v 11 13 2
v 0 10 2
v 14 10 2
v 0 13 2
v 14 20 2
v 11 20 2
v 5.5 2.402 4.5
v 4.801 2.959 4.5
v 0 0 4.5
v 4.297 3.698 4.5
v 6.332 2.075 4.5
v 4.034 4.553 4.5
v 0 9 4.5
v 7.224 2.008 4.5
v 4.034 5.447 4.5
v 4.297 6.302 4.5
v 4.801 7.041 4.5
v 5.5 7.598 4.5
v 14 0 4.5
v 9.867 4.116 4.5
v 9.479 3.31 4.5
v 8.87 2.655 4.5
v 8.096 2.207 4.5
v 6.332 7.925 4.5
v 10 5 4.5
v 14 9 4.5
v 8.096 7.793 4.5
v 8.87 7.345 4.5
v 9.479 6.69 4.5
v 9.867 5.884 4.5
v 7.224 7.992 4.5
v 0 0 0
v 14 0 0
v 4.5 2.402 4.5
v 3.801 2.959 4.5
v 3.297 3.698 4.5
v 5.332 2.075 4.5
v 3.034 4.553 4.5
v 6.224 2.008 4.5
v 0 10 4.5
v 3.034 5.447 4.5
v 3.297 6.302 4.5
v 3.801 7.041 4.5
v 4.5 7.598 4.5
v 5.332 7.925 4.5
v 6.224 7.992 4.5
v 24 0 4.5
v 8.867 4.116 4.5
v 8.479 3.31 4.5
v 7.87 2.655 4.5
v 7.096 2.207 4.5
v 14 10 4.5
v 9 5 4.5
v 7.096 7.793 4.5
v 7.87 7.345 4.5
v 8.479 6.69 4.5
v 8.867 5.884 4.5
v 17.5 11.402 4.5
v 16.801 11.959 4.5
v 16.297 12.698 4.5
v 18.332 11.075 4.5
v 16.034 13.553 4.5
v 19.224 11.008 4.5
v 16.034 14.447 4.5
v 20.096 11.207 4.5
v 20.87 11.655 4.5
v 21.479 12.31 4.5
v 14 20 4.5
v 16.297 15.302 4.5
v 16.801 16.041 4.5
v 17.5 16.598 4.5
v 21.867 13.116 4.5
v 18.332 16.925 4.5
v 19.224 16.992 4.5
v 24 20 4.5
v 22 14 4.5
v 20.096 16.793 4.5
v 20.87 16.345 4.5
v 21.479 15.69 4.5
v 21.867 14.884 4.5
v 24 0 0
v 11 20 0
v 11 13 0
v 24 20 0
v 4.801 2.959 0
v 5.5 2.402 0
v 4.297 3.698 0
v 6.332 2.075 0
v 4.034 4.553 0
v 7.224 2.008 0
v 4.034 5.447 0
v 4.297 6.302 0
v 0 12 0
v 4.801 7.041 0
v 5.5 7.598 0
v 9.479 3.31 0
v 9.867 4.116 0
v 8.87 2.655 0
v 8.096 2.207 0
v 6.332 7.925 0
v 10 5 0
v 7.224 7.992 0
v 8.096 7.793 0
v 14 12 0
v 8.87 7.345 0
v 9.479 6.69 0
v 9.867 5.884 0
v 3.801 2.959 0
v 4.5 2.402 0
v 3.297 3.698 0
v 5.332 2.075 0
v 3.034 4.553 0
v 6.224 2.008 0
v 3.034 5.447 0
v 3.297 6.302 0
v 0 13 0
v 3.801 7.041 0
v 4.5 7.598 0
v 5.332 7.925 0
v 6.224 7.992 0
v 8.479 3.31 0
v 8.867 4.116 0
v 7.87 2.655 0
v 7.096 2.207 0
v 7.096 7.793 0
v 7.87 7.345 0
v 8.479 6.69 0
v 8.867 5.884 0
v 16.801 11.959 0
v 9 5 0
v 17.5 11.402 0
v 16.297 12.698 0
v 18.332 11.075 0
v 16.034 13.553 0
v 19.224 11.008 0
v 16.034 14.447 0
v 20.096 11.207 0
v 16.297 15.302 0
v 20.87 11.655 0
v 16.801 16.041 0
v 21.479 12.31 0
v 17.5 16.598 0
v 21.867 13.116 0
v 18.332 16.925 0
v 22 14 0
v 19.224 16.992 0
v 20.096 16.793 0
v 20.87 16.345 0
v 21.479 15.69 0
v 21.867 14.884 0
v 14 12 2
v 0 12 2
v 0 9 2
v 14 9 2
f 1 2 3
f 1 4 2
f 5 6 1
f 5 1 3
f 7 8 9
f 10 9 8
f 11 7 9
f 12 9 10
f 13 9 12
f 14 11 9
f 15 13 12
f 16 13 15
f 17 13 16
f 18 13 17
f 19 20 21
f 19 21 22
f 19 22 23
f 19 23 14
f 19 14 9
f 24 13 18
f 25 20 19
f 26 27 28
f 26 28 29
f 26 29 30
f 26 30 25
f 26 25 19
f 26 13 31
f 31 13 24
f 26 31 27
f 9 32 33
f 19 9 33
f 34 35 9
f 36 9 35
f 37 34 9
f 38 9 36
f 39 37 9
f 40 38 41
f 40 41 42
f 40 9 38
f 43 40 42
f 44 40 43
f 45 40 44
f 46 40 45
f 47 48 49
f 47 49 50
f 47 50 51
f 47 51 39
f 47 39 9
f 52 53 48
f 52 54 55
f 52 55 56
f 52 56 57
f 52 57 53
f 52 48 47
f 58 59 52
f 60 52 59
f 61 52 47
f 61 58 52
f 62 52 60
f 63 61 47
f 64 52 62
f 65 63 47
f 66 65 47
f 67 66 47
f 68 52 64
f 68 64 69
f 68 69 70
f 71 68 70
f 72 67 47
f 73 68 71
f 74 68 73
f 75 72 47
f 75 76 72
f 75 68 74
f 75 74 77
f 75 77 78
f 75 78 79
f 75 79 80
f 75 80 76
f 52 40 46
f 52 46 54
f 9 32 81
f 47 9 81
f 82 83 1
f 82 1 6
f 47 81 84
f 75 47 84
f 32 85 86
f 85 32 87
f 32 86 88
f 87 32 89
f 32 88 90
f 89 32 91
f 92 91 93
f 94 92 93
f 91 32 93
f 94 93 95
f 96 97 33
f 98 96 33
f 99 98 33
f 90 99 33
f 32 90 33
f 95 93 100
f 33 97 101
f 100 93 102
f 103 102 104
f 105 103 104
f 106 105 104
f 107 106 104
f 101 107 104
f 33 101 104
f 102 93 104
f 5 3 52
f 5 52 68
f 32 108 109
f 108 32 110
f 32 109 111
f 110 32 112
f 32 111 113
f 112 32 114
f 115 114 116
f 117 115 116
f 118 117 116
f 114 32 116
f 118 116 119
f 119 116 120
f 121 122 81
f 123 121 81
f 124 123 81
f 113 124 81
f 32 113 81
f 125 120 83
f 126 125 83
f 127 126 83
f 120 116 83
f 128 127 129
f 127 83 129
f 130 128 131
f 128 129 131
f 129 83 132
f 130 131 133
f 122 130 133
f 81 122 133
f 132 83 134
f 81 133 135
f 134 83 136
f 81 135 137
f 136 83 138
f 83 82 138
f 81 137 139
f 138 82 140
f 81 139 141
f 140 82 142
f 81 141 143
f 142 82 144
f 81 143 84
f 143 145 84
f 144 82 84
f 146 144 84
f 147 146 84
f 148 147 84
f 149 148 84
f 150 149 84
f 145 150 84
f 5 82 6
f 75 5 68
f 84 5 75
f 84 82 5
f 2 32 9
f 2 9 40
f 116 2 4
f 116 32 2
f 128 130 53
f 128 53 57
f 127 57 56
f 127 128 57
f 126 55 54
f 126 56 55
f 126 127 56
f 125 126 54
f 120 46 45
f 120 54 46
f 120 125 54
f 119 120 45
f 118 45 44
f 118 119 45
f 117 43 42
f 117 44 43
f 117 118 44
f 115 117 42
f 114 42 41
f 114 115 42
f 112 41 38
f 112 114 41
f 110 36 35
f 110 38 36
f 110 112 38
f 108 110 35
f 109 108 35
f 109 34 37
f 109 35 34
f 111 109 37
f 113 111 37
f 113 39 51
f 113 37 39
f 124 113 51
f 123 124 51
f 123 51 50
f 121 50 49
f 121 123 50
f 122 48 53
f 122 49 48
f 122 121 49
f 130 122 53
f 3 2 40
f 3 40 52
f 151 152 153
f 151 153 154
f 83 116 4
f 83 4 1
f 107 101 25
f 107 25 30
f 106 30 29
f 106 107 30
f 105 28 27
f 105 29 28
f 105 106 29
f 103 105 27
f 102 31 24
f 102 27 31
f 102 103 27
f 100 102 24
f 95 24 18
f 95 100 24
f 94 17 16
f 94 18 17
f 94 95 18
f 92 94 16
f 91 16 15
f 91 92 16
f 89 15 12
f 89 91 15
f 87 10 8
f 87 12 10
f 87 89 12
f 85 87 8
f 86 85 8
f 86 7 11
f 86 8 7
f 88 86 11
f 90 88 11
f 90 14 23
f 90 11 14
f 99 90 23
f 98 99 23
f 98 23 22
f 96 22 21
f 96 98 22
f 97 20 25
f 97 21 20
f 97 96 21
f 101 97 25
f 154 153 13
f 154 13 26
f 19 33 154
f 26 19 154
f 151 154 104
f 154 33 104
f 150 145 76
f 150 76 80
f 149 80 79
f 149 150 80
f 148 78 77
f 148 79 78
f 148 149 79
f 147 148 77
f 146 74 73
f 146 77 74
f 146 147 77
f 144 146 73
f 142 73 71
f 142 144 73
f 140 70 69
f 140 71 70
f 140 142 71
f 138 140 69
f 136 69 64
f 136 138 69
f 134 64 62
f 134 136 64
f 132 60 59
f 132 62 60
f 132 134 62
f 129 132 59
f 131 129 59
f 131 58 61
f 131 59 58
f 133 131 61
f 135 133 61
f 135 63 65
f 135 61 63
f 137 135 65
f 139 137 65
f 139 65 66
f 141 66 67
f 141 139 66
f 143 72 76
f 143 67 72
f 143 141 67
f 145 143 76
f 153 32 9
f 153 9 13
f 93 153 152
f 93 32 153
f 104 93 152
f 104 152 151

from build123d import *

# Parameters (mm, degrees)
CYLINDER_R        = 3
CYLINDER_DEPTH    = 10
BOX001_W          = 14
BOX001_H          = 9
BOX001_DEPTH      = 4.5
BOX_W             = 14
BOX_H             = 12
BOX_DEPTH         = 2
CYLINDER002_R     = 3
CYLINDER002_DEPTH = 10
CYLINDER001_R     = 3
CYLINDER001_DEPTH = 10
BOX002_W          = 14
BOX002_H          = 10
BOX002_DEPTH      = 4.5
BOX004_W          = 13
BOX004_H          = 20
BOX004_DEPTH      = 2
BOX005_W          = 10
BOX005_H          = 20
BOX005_DEPTH      = 4.5
BOX003_W          = 14
BOX003_H          = 13
BOX003_DEPTH      = 2


with BuildPart() as cylinder:
    # Cylinder → Cylinder (new body)
    with BuildSketch(Plane(origin=(7, 5, -1), x_dir=(1, 0, 0), z_dir=(0, 0, 1))):
        Circle(CYLINDER_R)
    extrude(amount=CYLINDER_DEPTH)


with BuildPart() as cube001:
    # Box001 → Box001 (new body)
    with BuildSketch(Plane.XY):
        with Locations((7, 4.5)):
            Rectangle(BOX001_W, BOX001_H)
    extrude(amount=BOX001_DEPTH)


with BuildPart() as linear:
    # Box → Box (new body)
    with BuildSketch(Plane.XY):
        with Locations((7, 6)):
            Rectangle(BOX_W, BOX_H)
    extrude(amount=BOX_DEPTH)

    # Fusion: union Cube001
    add(cube001.part)

    # Cut: cut Cylinder
    add(cylinder.part, mode=Mode.SUBTRACT)


with BuildPart() as cylinder002:
    # Cylinder002 → Cylinder002 (new body)
    with BuildSketch(Plane(origin=(19, 14, -1), x_dir=(1, 0, 0), z_dir=(0, 0, 1))):
        Circle(CYLINDER002_R)
    extrude(amount=CYLINDER002_DEPTH)


with BuildPart() as fusion001:
    # Cylinder001 → Cylinder001 (new body)
    with BuildSketch(Plane(origin=(6, 5, -1), x_dir=(1, 0, 0), z_dir=(0, 0, 1))):
        Circle(CYLINDER001_R)
    extrude(amount=CYLINDER001_DEPTH)

    # Fusion001: union Cylinder002
    add(cylinder002.part)


with BuildPart() as cube002:
    # Box002 → Box002 (new body)
    with BuildSketch(Plane.XY):
        with Locations((7, 5)):
            Rectangle(BOX002_W, BOX002_H)
    extrude(amount=BOX002_DEPTH)


with BuildPart() as cube004:
    # Box004 → Box004 (new body)
    with BuildSketch(Plane(origin=(11, 0, 0), x_dir=(1, 0, 0), z_dir=(0, 0, 1))):
        with Locations((6.5, 10)):
            Rectangle(BOX004_W, BOX004_H)
    extrude(amount=BOX004_DEPTH)


with BuildPart() as cube005:
    # Box005 → Box005 (new body)
    with BuildSketch(Plane(origin=(14, 0, 0), x_dir=(1, 0, 0), z_dir=(0, 0, 1))):
        with Locations((5, 10)):
            Rectangle(BOX005_W, BOX005_H)
    extrude(amount=BOX005_DEPTH)


with BuildPart() as angular:
    # Box003 → Box003 (new body)
    with BuildSketch(Plane.XY):
        with Locations((7, 6.5)):
            Rectangle(BOX003_W, BOX003_H)
    extrude(amount=BOX003_DEPTH)

    # Fusion002: union Cube002, Cube004, Cube005
    add(cube002.part)
    add(cube004.part)
    add(cube005.part)

    # Cut001: cut Fusion001
    add(fusion001.part, mode=Mode.SUBTRACT)


solid = Compound([linear.part, angular.part])
